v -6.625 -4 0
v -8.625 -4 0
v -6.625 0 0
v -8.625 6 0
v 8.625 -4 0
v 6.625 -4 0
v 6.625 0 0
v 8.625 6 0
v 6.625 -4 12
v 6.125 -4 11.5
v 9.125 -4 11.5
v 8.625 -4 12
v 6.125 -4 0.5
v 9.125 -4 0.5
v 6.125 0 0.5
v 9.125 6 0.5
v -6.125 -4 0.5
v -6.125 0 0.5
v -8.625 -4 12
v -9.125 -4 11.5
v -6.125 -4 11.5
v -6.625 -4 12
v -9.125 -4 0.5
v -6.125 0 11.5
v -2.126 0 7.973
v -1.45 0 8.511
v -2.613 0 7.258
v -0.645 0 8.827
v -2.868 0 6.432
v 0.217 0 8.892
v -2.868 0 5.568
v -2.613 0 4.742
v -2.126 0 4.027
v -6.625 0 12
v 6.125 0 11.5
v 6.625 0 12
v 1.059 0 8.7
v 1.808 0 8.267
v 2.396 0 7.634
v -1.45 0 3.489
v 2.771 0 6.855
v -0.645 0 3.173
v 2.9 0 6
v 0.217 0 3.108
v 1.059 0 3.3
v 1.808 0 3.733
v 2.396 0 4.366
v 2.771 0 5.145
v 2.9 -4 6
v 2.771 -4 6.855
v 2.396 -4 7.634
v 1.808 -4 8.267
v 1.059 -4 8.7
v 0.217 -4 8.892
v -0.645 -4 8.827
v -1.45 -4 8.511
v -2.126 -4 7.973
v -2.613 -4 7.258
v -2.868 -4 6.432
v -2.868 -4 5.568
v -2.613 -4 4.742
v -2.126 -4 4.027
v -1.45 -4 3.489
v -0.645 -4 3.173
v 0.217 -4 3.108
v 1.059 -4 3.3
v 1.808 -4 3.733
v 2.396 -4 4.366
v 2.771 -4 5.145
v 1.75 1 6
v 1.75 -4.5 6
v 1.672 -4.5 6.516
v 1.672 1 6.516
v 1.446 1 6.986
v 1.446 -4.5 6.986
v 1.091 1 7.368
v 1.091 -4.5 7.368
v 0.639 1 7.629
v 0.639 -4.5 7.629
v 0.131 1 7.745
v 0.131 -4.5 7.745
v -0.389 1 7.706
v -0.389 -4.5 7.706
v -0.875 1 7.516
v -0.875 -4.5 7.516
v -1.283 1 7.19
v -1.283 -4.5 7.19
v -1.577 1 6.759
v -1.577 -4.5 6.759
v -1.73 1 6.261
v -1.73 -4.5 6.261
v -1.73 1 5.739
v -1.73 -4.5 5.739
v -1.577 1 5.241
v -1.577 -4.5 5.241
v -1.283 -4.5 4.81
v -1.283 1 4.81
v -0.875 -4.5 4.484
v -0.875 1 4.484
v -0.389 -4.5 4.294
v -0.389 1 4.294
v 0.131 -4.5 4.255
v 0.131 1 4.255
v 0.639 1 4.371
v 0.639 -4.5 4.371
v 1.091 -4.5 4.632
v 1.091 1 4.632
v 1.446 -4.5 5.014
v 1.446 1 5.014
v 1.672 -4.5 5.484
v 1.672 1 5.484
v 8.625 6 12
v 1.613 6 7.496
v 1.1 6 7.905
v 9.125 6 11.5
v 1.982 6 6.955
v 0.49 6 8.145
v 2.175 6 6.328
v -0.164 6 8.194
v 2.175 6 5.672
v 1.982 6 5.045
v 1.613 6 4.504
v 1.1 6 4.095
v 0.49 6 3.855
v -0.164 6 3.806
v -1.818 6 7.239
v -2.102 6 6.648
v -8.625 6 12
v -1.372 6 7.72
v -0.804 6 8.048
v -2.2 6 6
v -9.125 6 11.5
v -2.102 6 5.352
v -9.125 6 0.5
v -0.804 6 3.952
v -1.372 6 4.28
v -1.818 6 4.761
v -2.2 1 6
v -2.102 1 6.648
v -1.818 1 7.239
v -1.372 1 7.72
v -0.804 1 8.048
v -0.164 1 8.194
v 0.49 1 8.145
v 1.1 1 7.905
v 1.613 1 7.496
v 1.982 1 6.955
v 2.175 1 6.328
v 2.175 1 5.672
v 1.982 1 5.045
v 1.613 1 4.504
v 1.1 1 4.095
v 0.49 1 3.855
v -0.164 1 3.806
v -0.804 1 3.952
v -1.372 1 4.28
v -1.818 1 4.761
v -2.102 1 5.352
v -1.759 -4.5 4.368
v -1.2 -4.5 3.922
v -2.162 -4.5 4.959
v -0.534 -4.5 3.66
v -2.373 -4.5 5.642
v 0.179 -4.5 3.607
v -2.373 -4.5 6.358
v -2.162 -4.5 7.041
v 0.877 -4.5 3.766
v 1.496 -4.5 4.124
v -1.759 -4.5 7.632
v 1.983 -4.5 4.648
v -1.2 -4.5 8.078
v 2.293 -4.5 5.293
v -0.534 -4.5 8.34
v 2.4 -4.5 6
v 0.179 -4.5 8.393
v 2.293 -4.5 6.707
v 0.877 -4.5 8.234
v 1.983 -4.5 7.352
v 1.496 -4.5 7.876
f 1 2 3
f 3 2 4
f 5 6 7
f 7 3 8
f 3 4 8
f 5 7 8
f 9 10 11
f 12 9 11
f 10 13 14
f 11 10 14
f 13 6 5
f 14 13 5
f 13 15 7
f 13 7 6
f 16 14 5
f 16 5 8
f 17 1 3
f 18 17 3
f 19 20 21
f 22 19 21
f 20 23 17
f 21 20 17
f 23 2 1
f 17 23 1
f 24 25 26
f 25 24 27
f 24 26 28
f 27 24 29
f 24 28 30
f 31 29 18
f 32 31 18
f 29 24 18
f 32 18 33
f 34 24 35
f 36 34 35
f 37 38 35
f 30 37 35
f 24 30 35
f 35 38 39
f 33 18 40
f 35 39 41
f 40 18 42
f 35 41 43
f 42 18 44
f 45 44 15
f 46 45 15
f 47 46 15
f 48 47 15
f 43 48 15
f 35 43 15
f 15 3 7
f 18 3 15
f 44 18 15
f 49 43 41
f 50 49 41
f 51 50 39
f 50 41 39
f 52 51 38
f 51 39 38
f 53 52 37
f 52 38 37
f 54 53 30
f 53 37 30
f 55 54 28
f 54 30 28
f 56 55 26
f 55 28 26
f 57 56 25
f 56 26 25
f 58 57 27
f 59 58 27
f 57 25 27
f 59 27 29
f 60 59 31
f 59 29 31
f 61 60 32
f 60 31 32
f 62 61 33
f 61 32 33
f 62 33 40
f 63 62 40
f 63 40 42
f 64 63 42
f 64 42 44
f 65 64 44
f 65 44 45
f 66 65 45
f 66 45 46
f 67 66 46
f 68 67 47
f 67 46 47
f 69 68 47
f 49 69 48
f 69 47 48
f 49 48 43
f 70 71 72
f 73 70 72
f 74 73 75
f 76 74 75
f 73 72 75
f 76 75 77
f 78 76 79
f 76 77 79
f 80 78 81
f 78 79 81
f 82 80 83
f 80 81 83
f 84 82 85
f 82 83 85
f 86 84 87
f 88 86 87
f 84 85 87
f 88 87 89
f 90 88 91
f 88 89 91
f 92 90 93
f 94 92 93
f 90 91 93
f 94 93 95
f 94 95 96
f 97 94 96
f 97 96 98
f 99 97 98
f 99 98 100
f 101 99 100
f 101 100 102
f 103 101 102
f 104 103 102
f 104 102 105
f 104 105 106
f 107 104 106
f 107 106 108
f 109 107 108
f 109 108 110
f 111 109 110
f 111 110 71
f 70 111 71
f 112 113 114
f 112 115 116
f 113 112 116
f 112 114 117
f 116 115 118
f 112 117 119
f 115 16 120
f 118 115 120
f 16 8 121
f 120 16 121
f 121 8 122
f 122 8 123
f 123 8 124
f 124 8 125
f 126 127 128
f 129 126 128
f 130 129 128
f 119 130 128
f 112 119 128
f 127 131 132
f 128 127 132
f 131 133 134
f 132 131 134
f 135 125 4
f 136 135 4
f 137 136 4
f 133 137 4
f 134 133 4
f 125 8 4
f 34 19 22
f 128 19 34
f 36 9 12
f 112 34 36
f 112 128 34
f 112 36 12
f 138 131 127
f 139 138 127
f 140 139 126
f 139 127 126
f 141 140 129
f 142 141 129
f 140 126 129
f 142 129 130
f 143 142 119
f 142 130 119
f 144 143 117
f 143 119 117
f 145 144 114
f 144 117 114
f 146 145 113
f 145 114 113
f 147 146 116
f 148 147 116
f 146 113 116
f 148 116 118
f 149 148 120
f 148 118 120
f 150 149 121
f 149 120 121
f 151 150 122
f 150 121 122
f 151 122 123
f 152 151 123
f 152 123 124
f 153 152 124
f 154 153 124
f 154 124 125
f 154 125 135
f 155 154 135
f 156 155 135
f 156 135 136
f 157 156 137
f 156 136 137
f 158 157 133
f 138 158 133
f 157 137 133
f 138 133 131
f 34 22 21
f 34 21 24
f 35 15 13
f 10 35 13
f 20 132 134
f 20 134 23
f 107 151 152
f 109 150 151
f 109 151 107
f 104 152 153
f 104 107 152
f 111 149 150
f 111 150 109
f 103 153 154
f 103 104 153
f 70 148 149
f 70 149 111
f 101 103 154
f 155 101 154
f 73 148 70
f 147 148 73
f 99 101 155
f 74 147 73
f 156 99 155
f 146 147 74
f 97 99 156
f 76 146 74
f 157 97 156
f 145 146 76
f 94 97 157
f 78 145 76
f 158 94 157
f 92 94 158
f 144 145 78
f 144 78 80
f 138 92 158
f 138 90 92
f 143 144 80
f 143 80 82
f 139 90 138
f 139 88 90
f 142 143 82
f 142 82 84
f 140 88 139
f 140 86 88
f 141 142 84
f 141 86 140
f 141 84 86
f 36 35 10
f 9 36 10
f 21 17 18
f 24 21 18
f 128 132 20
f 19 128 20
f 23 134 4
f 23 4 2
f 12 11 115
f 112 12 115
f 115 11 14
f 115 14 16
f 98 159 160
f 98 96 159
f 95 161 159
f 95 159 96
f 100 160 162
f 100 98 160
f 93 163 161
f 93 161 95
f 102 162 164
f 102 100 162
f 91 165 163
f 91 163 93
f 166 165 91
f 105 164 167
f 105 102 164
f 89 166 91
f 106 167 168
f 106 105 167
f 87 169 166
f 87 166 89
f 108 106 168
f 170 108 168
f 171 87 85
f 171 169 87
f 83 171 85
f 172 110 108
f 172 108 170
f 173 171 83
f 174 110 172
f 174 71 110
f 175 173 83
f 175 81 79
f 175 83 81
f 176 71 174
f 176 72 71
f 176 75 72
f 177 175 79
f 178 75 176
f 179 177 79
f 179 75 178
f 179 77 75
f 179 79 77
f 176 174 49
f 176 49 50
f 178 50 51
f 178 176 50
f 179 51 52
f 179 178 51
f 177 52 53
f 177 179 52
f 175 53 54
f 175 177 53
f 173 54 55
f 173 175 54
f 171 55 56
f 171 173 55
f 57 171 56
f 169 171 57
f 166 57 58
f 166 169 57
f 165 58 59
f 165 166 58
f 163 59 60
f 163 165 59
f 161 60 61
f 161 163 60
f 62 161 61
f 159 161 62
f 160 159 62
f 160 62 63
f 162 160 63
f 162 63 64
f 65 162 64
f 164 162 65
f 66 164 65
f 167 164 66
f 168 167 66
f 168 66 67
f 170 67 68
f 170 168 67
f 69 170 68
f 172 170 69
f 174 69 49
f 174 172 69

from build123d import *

# Parameters (mm, degrees)
PAD_DEPTH       = 12
SKETCH001_R     = 2.9
PAD001_DEPTH    = 4.5
SKETCH002_R     = 1.75
POCKET_DEPTH    = 10.501
SKETCH003_R     = 2.2
POCKET001_DEPTH = 5
CHAMFER_SIZE    = 0.5
CHAMFER001_SIZE = 0.5


with BuildPart() as part:
    # Sketch → Pad (new body)
    with BuildSketch(Plane.XY):
        Polygon((-9.125, -4), (-6.125, -4), (-6.125, 0), (6.125, 0), (6.125, -4), (9.125, -4), (9.125, 6), (-9.125, 6), align=None)
    extrude(amount=PAD_DEPTH)

    # Sketch001 (on Face3 of Pad) → Pad001 (join)
    with BuildSketch(Plane.XZ):
        with Locations((0, 6)):
            Circle(SKETCH001_R)
    extrude(amount=PAD001_DEPTH)

    # Sketch002 (on Face12 of Pad001) → Pocket (cut, through all)
    with BuildSketch(Plane.XZ.offset(4.5)):
        with Locations((0, 6)):
            Circle(SKETCH002_R)
    extrude(amount=-POCKET_DEPTH, mode=Mode.SUBTRACT)

    # Sketch003 (on Face6 of Pocket) → Pocket001 (cut)
    with BuildSketch(Plane(origin=(0, 6, 0), x_dir=(-1, 0, 0), z_dir=(0, 1, 0))):
        with Locations((0, 6)):
            Circle(SKETCH003_R)
    extrude(amount=-POCKET001_DEPTH, mode=Mode.SUBTRACT)

    # Chamfer
    chamfer_edges = [part.edges().sort_by_distance(p)[0] for p in [
        (-2.9, -4.5, 6),
    ]]
    chamfer(chamfer_edges, length=CHAMFER_SIZE)

    # Chamfer001
    chamfer001_edges = [part.edges().sort_by_distance(p)[0] for p in [
        (-6.125, -2, 0),
        (-6.125, -2, 12),
        (6.125, -2, 0),
        (9.125, 1, 0),
        (9.125, 1, 12),
        (6.125, -2, 12),
        (-9.125, 1, 12),
        (-9.125, 1, 0),
    ]]
    chamfer(chamfer001_edges, length=CHAMFER001_SIZE)


solid = part.part
